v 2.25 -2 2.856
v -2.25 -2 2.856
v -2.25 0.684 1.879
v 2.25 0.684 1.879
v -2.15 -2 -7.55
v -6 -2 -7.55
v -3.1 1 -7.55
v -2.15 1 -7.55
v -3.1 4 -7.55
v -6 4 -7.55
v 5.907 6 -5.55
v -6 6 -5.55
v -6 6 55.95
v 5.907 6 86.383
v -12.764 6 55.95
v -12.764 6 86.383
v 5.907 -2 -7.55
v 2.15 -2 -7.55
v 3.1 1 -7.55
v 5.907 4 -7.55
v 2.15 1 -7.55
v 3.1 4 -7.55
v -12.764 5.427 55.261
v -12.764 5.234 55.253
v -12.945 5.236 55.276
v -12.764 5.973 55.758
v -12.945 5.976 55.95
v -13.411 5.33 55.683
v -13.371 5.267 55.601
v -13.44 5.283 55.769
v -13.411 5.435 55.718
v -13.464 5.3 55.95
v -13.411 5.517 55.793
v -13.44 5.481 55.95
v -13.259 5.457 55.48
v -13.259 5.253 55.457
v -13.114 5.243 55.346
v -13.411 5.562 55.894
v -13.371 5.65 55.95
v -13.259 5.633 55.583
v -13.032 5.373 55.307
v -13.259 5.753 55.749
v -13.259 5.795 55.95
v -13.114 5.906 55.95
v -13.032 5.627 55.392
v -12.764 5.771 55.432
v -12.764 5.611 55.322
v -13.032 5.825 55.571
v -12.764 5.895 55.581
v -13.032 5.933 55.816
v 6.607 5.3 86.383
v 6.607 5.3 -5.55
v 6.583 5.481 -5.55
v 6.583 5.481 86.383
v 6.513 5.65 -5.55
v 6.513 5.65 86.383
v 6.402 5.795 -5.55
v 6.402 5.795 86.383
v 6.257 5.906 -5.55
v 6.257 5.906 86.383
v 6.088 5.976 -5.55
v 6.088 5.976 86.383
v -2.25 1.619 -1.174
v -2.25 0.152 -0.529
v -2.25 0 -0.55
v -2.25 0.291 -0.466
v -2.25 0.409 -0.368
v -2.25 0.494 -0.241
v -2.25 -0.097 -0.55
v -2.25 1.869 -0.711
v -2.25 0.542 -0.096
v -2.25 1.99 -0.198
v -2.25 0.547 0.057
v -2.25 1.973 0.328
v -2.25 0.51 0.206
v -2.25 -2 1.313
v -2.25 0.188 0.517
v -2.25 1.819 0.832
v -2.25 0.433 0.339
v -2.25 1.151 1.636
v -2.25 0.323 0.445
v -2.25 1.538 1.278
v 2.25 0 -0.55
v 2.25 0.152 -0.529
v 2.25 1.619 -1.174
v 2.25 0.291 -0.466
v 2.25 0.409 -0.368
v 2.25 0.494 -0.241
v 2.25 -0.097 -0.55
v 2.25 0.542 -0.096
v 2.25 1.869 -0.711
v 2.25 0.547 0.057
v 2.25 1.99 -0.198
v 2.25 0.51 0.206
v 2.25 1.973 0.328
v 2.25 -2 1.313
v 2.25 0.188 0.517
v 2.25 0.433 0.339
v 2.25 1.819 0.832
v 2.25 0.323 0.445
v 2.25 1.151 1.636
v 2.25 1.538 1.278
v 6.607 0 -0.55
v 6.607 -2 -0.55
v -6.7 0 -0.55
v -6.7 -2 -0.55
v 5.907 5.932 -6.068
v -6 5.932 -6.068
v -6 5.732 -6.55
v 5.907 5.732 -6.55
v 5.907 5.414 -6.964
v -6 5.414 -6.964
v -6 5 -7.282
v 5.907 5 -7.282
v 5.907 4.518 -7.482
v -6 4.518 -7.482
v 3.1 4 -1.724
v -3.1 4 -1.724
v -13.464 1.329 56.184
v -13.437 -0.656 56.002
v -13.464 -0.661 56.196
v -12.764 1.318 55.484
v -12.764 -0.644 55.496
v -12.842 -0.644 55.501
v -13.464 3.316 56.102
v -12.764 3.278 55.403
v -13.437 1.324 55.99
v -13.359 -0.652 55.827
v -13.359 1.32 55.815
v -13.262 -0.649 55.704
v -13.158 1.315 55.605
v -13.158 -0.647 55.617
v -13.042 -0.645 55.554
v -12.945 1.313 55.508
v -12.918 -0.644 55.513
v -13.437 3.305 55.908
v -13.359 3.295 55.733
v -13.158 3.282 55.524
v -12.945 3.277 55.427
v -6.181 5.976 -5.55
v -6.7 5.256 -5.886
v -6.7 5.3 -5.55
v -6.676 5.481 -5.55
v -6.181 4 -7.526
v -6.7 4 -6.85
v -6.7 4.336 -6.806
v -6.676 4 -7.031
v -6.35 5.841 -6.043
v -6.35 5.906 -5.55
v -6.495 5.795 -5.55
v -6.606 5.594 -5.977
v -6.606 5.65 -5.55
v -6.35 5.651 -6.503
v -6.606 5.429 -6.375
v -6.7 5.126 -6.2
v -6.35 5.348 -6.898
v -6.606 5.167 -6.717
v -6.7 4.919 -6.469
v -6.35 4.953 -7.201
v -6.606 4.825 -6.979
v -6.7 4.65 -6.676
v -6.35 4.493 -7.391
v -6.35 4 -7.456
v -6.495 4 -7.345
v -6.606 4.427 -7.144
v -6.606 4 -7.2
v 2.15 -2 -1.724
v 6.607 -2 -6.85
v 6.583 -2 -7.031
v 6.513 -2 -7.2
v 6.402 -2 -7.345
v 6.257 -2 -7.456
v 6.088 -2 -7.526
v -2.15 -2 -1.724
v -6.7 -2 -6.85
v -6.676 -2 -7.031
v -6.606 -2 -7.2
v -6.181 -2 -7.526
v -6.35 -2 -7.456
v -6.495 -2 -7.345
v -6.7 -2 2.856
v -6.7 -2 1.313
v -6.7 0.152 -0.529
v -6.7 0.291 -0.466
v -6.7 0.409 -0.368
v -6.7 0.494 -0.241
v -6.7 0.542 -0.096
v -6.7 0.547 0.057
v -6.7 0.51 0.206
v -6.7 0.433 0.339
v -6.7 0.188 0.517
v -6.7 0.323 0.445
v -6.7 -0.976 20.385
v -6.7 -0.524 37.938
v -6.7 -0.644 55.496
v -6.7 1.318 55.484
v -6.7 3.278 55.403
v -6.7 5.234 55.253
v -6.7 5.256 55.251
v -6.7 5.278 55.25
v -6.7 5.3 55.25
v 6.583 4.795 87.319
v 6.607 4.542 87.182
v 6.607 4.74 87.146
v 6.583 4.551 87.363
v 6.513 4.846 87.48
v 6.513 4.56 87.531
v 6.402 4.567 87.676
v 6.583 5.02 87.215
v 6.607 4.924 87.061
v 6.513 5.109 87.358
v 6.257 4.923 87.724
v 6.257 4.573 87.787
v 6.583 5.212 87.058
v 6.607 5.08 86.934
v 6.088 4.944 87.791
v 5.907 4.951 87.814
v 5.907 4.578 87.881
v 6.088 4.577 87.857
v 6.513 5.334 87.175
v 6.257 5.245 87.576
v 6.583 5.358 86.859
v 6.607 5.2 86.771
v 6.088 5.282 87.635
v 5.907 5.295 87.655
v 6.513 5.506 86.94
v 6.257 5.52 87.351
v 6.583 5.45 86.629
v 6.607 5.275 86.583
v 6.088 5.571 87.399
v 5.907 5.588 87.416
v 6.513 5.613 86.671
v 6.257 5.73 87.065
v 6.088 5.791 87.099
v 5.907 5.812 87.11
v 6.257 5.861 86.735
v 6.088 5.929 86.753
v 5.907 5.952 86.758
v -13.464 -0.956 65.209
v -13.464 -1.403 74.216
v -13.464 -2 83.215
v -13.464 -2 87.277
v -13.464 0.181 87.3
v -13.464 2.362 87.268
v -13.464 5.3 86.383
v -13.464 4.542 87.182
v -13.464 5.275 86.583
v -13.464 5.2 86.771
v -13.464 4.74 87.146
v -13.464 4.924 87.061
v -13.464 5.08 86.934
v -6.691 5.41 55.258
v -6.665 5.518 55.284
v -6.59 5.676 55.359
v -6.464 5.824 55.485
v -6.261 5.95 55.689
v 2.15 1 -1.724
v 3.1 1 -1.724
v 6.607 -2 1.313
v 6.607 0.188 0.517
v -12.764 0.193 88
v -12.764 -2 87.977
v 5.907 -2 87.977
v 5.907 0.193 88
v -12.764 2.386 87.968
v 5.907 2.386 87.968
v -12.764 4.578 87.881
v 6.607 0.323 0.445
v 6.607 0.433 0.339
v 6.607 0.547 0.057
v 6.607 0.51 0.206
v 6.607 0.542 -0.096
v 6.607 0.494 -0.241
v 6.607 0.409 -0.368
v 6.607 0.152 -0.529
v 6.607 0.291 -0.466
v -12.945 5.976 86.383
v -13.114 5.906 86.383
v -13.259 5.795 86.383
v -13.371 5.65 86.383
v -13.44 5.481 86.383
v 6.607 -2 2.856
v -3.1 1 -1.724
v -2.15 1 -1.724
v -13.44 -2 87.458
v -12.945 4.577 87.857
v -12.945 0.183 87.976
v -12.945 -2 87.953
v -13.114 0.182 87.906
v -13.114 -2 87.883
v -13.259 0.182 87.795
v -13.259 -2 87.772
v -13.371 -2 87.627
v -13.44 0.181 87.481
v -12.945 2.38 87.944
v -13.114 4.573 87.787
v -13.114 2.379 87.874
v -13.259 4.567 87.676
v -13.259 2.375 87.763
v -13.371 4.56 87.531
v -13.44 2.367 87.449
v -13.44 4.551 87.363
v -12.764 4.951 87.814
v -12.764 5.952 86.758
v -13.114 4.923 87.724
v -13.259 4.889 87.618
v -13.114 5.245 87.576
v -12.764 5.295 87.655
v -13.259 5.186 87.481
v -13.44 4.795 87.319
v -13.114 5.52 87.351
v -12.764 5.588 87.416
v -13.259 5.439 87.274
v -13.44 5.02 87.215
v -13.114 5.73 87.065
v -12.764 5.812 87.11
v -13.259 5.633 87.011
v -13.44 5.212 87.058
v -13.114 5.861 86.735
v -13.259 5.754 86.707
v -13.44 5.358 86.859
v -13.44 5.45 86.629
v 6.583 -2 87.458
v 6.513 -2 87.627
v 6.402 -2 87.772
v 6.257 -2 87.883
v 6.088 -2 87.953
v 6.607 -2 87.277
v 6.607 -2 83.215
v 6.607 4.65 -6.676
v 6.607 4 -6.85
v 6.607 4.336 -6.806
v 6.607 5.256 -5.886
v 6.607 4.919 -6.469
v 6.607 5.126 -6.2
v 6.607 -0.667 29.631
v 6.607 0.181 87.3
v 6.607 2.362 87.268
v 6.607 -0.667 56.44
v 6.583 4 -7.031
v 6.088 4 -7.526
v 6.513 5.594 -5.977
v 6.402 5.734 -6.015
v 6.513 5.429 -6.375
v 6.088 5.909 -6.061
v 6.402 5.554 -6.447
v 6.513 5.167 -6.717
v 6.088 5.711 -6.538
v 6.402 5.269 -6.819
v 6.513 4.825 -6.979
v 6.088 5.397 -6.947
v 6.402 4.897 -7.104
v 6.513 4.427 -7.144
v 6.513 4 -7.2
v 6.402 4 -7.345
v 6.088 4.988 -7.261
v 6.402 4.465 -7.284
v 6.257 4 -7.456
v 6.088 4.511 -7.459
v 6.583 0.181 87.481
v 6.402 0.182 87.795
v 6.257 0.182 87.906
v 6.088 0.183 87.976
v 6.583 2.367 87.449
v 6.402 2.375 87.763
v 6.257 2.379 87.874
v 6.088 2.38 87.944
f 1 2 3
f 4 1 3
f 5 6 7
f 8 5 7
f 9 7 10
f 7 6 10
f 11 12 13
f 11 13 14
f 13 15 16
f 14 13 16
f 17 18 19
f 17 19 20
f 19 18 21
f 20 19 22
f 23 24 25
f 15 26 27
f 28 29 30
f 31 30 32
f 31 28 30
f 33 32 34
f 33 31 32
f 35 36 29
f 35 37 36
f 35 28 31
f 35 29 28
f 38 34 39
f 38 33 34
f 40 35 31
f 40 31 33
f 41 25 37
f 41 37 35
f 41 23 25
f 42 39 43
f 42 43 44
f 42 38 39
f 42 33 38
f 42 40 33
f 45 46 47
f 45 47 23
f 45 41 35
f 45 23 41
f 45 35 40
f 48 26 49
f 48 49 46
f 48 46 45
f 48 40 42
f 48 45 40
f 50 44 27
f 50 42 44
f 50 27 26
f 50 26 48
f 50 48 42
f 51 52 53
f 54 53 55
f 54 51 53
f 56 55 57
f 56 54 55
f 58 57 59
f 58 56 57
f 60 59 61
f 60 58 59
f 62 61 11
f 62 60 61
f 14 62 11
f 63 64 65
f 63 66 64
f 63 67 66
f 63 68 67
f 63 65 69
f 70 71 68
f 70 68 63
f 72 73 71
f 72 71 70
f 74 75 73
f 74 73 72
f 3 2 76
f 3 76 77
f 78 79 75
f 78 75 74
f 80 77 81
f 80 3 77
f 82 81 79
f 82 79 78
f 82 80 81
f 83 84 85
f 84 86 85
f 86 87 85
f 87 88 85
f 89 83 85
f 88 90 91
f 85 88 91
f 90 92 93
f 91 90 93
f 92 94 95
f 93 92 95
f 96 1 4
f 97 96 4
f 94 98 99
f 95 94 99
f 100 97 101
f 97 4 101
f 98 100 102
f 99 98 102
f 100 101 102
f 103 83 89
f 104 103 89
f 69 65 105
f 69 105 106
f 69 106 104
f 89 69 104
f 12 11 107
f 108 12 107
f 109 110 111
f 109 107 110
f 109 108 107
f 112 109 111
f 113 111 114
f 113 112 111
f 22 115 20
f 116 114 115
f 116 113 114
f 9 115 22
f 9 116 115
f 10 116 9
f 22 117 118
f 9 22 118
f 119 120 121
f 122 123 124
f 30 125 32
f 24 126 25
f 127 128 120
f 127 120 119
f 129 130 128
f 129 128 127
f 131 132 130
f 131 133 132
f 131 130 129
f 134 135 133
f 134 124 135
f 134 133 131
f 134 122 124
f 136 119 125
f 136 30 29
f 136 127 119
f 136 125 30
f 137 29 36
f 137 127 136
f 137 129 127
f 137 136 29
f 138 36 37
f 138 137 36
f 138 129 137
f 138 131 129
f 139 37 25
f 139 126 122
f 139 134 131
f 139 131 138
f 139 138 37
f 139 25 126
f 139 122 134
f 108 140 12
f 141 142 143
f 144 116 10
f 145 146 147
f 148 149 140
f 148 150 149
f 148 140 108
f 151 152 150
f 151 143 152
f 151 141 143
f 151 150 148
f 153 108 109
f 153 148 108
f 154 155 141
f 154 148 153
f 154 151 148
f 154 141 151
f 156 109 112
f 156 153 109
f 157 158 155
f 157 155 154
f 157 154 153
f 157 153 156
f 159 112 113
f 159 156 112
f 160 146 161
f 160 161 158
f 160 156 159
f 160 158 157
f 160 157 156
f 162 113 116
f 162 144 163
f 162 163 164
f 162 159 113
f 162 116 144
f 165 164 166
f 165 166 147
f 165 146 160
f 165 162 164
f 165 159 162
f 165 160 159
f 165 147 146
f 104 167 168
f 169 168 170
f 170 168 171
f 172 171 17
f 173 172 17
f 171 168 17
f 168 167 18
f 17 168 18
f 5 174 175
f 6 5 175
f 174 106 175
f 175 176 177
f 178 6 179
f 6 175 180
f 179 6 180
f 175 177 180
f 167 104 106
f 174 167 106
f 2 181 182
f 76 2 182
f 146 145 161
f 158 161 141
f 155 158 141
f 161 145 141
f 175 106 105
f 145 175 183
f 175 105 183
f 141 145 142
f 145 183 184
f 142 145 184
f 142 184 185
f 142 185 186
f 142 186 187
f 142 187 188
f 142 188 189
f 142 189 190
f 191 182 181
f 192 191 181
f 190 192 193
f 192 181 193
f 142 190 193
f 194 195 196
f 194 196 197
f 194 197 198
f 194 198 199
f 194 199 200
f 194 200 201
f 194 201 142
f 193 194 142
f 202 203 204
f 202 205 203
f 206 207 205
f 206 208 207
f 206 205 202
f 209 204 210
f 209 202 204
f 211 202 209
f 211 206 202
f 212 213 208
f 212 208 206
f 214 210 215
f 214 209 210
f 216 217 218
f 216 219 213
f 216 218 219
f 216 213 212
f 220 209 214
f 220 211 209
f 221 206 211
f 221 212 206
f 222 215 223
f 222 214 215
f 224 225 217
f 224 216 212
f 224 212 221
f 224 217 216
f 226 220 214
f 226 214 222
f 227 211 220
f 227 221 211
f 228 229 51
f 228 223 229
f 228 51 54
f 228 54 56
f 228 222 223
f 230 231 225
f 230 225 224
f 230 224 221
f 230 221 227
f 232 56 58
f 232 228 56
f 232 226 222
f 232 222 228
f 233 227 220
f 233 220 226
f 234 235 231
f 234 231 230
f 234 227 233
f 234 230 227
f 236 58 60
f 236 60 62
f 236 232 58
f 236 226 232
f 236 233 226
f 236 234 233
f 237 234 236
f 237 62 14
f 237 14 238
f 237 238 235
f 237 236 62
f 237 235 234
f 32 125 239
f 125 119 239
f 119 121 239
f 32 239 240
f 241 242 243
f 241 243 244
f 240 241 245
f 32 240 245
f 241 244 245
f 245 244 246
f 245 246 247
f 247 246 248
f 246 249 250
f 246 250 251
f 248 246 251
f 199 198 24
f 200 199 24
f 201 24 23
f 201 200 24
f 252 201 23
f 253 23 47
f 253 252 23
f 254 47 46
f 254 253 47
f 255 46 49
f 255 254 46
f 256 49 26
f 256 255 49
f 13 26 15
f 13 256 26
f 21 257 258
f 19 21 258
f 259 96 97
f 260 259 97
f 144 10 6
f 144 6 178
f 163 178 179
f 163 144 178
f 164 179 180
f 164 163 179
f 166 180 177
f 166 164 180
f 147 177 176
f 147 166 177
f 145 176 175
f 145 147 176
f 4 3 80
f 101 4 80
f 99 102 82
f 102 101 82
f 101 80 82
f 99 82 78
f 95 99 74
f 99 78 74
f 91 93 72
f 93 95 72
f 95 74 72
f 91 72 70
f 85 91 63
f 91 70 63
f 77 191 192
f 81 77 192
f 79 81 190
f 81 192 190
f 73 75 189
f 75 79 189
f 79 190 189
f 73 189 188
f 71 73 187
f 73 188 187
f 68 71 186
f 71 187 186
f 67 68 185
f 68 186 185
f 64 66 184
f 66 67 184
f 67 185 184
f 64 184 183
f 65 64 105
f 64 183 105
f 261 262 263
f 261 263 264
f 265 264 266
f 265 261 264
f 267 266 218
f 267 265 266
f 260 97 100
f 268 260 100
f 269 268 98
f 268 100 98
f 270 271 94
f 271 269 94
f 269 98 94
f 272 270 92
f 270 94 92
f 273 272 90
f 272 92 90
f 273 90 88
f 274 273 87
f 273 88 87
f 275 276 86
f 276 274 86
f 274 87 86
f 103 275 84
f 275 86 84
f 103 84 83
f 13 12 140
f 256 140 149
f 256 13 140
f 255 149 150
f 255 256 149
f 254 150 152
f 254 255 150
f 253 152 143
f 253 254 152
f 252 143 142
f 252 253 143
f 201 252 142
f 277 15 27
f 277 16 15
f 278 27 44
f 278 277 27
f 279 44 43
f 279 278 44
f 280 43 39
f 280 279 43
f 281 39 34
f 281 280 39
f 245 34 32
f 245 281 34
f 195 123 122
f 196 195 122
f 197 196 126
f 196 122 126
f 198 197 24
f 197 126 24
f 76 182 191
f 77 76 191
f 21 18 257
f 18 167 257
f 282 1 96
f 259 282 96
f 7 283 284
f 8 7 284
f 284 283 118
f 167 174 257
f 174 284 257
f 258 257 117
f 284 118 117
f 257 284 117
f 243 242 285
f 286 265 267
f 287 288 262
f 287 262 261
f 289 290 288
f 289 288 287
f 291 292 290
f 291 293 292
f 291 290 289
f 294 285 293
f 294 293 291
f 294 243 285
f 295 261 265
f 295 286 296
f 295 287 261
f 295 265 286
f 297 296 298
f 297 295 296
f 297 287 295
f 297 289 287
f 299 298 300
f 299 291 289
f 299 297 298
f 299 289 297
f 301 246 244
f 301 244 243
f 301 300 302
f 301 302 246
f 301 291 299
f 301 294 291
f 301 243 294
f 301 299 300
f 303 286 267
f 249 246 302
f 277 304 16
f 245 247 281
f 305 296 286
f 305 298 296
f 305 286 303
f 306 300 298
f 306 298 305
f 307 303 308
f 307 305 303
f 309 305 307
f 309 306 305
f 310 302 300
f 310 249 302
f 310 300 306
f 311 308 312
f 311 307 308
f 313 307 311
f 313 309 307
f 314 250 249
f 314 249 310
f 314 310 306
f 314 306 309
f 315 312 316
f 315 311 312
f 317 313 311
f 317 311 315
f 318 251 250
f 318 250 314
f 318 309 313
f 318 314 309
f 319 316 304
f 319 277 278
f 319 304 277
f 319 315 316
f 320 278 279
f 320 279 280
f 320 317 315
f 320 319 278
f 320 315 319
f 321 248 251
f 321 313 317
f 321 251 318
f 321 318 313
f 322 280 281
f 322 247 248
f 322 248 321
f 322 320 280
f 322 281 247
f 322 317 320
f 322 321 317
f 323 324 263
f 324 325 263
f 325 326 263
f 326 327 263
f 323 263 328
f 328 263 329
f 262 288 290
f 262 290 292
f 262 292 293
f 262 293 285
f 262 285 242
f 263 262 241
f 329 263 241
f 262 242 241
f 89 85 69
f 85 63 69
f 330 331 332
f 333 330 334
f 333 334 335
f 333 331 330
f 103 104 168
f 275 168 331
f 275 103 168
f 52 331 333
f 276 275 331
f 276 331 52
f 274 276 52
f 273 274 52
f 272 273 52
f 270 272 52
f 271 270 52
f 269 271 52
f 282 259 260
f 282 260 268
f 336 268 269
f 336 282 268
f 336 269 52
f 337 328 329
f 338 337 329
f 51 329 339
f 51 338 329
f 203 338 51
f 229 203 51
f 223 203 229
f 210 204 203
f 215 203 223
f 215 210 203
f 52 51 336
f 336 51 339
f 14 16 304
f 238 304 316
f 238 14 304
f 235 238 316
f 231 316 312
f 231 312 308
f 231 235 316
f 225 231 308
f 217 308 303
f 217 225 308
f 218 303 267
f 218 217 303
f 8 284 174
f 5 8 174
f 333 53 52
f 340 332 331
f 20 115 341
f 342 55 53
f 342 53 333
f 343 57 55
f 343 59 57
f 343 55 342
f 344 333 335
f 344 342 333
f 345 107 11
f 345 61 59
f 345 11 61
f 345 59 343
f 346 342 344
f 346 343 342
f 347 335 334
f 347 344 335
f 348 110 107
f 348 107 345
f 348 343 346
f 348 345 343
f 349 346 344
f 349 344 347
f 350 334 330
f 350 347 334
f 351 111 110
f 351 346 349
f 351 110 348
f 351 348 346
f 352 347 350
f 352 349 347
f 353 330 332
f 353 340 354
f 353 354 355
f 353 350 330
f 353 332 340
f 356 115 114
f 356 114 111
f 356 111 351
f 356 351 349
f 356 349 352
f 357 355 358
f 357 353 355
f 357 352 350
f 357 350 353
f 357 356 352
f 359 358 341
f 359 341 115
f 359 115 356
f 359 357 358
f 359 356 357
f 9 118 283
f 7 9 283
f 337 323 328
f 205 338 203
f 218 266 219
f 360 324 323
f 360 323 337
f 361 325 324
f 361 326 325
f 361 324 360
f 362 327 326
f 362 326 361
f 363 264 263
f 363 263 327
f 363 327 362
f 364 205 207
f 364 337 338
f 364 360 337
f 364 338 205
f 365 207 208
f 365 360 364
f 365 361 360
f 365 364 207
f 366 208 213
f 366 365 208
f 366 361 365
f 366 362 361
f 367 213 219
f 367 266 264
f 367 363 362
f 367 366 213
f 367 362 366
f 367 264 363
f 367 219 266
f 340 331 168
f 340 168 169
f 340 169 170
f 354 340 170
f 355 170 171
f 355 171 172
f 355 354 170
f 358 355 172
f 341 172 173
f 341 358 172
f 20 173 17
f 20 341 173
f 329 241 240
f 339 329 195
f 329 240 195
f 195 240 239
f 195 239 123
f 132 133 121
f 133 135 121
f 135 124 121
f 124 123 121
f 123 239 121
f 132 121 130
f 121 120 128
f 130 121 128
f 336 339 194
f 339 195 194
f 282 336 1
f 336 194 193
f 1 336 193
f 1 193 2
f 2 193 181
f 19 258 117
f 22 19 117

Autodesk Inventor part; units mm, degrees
ref_plane "YZ Plane" through (0, 0, 0) normal (1, 0, 0) x (0, 1, 0)
ref_plane "XZ Plane" through (0, 0, 0) normal (0, 1, 0) x (-1, 0, 0)
ref_plane "Slot Start Plane" through (0, 0, -1.7245) normal (0, 0, 1) x (1, 0, 0)
sketch "Key Profile" plane through (0, 0, 0) normal (1, 0, 0) x (0, 1, 0)
  line L0 (-2, 2.8563) -> (0.684, 1.8794)
  arc A0 (1.6188, -1.1745) -> (0.684, 1.8794) centre (0, 0) ccw
  line L1 (-2, 1.3132) -> (0.1881, 0.5168)
  arc A1 (0, -0.55) -> (0.1881, 0.5168) centre (0, 0) ccw
  line L2 (-2, 2.8563) -> (-2, -0.55)
  line L3 (0, 0) -> (-2, 0) construction
  line L4 (0, -0.55) -> (-2, -0.55)
  line L5 (1.6188, -1.1745) -> (-0.097, -0.55)
  line L6 (6, -5.55) -> (6, 87.7952)
  line L7 (-2, 87.9773) -> (-2, 2.8563)
  arc A2 (6, 87.7952) -> (-2, 87.9773) centre (0, 0) ccw
  line L8 (-2, -0.55) -> (-2, -7.55)
  arc A3 (4, -7.55) -> (6, -5.55) centre (4, -5.55) ccw
  line L9 (-2, -7.55) -> (4, -7.55)
  arc A4 (6, 55.1747) -> (-2, 55.464) centre (0, 0) ccw
  arc A5 (-2, 2.8563) -> (-2, 83.2148) centre (-539.3737, 43.0355) ccw
  point P0 (-0.5, 43.0355)
  point P1 (-0.6441, 55.4963)
  dimension "my_hingeCutRad" = 0.55
  dimension "my_hingeDepth" = 2
  dimension "my_hingeRegCutRad" = 2
  dimension "keyLength" = 88
  dimension "my_KeyHeight" = 8
  dimension "d107" = 20
  dimension "d122" = 4
  dimension "slotOffset" = 1.1745
  dimension "my_backWidth" = 7
  dimension "d128" = 55.5
  dimension "d135" = 1.5
  dimension "d136" = 4.7625
extrude "Upper (u)" add sketch "Key Profile" along normal blind 6.6071 and the other way blind 6.7 contours A5 A4 L6 A3 L9 L8 L4 L5 A0 L0 | L0 A0 L5 L4 A1 L1 L2
extrude "Lower (d)" add sketch "Key Profile" along normal blind 6.6071 and the other way blind 13.4643 contours A5 L7 A2 L6 A4
extrude "Protrusion Cutout" cut sketch "Key Profile" along normal mid plane 4.5 contours L0 A0 L5 L4 A1 L1 L2
fillet "Front Fillet" radius 1.5 1 edges at (-3.4286, 6, 87.7952)
sketch "Slot Sketch" plane through (0, 0, -1.7245) normal (0, 0, 1) x (1, 0, 0)
  line L0 (2.15, -2) -> (2.15, 1)
  line L1 (3.1, 4) -> (-3.1, 4)
  line L2 (-2.15, 1) -> (-2.15, -2)
  line L3 (-2.15, -2) -> (2.15, -2)
  line L4 (0, -2) -> (0, 4) construction
  line L5 (-3.1, 4) -> (-3.1, 1)
  line L6 (-3.1, 1) -> (-2.15, 1)
  line L7 (2.15, 1) -> (3.1, 1)
  line L8 (3.1, 1) -> (3.1, 4)
  point P0 (0, 0)
  dimension "d109" = 2
  dimension "my_slotHeadOffset" = 1
  dimension "my_slotHeadHeight" = 3
  dimension "my_slotHeadWidth" = 6.2
  dimension "my_neckSlotWidth" = 4.3
extrude "Slot" cut sketch "Slot Sketch" against normal through all
fillet "Edge Softening" radius 0.7 13 edges at (6.6071, 5.4142, -6.9642) (6.6071, 1, -7.55) (6.6071, 6, 40.4164) (-6.7, 5.4142, -6.9642) (-6.7, 1, -7.55) (-6.7, 6, 24.8124) (-13.4643, 5.5879, 87.4156) (-13.4643, 1.2899, 87.9905) (-13.4643, 6, 70.7788) (6.6071, 5.5879, 87.4156) (6.6071, 1.2899, 87.9905) (-13.4643, 2.6828, 55.4351) (-10.0821, 6, 55.1747)
equation "\"my_headHeight\" = 3"
equation "\"my_headOffset\" = 1"
equation "\"whiteKeyWidth\" = 20.07143"
properties part number "EKey0"
